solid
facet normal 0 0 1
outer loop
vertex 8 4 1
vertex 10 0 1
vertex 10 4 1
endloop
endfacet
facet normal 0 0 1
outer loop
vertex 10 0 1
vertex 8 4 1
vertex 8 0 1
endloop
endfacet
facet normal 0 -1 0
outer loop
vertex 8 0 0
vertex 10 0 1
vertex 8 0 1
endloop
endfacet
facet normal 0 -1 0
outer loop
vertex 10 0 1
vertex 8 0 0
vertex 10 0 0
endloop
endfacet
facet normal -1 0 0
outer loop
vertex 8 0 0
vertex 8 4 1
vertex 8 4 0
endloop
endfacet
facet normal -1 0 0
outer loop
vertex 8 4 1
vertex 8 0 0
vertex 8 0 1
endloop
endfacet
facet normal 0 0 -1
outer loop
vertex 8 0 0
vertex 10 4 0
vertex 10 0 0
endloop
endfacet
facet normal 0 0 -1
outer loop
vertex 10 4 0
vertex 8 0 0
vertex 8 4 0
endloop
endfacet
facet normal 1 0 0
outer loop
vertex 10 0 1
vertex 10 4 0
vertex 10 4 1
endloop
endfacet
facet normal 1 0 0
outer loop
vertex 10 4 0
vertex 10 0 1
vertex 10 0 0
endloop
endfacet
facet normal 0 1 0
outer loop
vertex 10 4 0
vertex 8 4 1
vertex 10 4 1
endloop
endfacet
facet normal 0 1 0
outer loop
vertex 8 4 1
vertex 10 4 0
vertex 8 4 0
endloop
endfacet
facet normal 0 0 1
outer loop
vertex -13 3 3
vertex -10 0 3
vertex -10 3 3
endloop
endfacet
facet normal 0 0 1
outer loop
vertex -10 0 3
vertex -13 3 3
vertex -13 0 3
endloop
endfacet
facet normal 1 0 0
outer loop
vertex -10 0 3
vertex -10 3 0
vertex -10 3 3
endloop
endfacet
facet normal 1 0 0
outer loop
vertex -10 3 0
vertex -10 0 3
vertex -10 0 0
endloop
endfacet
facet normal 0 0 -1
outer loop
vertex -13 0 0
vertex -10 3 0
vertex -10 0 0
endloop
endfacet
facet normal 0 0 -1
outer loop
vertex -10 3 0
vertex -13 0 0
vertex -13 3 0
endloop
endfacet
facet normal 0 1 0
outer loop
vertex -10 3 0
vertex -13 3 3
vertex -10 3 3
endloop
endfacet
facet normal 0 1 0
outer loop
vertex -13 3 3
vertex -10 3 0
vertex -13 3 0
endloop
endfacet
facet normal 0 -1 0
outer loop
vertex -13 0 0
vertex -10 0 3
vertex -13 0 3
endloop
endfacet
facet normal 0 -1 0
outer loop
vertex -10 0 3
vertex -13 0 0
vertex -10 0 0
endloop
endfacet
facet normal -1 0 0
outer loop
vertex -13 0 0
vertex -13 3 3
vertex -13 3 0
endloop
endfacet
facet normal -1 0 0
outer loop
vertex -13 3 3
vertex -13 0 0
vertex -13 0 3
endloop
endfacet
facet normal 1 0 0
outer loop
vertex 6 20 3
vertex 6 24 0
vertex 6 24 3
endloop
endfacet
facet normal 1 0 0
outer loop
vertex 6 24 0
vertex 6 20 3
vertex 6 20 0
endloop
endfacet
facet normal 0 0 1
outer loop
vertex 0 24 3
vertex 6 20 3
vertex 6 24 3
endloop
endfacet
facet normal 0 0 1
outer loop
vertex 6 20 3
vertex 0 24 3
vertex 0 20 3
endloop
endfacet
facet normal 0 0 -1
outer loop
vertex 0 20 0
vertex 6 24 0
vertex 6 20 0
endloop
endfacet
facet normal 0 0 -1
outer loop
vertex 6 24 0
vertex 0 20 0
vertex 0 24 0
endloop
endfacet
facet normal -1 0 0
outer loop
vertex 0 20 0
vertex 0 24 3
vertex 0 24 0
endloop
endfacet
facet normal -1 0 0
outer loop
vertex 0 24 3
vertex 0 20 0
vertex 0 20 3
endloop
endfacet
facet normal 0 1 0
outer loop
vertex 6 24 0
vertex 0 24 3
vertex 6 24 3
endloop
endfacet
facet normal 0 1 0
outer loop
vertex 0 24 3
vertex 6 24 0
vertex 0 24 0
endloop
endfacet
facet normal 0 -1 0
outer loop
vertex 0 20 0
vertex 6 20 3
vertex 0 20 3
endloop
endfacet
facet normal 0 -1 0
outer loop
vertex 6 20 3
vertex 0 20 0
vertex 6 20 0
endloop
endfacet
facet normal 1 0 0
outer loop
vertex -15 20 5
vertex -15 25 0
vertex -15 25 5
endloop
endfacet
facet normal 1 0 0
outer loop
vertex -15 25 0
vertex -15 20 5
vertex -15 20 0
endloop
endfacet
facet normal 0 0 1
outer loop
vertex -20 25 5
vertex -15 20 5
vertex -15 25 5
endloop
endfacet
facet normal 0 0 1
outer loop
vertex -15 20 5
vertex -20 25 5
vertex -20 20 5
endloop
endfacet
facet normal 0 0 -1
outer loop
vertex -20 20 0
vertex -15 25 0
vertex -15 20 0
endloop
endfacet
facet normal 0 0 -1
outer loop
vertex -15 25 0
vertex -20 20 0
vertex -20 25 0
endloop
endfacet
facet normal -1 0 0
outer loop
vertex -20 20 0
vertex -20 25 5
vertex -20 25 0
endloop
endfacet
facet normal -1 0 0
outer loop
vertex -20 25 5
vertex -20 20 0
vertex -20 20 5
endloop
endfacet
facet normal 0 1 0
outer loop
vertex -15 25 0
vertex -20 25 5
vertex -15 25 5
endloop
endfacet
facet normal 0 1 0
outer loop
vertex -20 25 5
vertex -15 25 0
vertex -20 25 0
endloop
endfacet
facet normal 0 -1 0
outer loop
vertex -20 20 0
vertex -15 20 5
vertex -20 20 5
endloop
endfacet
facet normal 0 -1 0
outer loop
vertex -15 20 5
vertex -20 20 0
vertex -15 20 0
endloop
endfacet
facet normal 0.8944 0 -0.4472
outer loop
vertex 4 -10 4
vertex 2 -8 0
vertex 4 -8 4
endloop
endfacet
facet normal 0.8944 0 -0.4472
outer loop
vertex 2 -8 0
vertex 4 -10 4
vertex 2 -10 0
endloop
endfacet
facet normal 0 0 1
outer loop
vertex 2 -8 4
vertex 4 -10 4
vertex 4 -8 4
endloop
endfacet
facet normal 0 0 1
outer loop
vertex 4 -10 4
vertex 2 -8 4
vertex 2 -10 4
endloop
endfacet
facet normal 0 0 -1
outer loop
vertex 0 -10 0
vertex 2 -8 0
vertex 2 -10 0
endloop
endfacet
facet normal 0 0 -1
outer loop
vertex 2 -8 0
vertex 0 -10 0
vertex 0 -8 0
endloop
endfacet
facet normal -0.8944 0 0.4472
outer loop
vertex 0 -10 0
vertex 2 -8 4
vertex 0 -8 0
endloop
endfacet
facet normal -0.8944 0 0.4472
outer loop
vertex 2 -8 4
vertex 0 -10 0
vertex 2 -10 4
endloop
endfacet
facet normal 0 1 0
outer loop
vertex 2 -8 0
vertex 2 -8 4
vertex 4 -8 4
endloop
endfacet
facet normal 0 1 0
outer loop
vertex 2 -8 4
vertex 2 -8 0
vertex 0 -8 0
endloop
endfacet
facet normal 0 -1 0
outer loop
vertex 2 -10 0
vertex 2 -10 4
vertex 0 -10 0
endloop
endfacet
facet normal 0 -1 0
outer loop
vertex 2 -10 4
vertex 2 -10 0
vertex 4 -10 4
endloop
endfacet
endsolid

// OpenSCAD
// Original CanvasNet test fixture: every kind of transform on its own colored part.
// The comments give the analytic extent of each part; together the parts span x -20..10, y -10..25, z 0..5.

// A bar turned a quarter turn about Z and moved right: x 8..10, y 0..4, z 0..1
color("red") translate([10, 0, 0]) rotate([0, 0, 90]) cube([4, 2, 1]);

// A cube mirrored across the YZ plane: x -13..-10, y 0..3, z 0..3
color("green") mirror([1, 0, 0]) translate([10, 0, 0]) cube([3, 3, 3]);

// A block stretched by a non-uniform scale: x 0..6, y 20..24, z 0..3
color("blue") translate([0, 20, 0]) scale([2, 1, 0.5]) cube([3, 4, 6]);

// A block resized to a 5 unit cube: x -20..-15, y 20..25, z 0..5
color("orange") translate([-20, 20, 0]) resize([5, 5, 5]) cube([1, 2, 3]);

// A block sheared so that x grows by half of z: x 0..4, y -10..-8, z 0..4
color("purple") translate([0, -10, 0])
  multmatrix([[1, 0, 0.5, 0], [0, 1, 0, 0], [0, 0, 1, 0], [0, 0, 0, 1]]) cube([2, 2, 4]);
